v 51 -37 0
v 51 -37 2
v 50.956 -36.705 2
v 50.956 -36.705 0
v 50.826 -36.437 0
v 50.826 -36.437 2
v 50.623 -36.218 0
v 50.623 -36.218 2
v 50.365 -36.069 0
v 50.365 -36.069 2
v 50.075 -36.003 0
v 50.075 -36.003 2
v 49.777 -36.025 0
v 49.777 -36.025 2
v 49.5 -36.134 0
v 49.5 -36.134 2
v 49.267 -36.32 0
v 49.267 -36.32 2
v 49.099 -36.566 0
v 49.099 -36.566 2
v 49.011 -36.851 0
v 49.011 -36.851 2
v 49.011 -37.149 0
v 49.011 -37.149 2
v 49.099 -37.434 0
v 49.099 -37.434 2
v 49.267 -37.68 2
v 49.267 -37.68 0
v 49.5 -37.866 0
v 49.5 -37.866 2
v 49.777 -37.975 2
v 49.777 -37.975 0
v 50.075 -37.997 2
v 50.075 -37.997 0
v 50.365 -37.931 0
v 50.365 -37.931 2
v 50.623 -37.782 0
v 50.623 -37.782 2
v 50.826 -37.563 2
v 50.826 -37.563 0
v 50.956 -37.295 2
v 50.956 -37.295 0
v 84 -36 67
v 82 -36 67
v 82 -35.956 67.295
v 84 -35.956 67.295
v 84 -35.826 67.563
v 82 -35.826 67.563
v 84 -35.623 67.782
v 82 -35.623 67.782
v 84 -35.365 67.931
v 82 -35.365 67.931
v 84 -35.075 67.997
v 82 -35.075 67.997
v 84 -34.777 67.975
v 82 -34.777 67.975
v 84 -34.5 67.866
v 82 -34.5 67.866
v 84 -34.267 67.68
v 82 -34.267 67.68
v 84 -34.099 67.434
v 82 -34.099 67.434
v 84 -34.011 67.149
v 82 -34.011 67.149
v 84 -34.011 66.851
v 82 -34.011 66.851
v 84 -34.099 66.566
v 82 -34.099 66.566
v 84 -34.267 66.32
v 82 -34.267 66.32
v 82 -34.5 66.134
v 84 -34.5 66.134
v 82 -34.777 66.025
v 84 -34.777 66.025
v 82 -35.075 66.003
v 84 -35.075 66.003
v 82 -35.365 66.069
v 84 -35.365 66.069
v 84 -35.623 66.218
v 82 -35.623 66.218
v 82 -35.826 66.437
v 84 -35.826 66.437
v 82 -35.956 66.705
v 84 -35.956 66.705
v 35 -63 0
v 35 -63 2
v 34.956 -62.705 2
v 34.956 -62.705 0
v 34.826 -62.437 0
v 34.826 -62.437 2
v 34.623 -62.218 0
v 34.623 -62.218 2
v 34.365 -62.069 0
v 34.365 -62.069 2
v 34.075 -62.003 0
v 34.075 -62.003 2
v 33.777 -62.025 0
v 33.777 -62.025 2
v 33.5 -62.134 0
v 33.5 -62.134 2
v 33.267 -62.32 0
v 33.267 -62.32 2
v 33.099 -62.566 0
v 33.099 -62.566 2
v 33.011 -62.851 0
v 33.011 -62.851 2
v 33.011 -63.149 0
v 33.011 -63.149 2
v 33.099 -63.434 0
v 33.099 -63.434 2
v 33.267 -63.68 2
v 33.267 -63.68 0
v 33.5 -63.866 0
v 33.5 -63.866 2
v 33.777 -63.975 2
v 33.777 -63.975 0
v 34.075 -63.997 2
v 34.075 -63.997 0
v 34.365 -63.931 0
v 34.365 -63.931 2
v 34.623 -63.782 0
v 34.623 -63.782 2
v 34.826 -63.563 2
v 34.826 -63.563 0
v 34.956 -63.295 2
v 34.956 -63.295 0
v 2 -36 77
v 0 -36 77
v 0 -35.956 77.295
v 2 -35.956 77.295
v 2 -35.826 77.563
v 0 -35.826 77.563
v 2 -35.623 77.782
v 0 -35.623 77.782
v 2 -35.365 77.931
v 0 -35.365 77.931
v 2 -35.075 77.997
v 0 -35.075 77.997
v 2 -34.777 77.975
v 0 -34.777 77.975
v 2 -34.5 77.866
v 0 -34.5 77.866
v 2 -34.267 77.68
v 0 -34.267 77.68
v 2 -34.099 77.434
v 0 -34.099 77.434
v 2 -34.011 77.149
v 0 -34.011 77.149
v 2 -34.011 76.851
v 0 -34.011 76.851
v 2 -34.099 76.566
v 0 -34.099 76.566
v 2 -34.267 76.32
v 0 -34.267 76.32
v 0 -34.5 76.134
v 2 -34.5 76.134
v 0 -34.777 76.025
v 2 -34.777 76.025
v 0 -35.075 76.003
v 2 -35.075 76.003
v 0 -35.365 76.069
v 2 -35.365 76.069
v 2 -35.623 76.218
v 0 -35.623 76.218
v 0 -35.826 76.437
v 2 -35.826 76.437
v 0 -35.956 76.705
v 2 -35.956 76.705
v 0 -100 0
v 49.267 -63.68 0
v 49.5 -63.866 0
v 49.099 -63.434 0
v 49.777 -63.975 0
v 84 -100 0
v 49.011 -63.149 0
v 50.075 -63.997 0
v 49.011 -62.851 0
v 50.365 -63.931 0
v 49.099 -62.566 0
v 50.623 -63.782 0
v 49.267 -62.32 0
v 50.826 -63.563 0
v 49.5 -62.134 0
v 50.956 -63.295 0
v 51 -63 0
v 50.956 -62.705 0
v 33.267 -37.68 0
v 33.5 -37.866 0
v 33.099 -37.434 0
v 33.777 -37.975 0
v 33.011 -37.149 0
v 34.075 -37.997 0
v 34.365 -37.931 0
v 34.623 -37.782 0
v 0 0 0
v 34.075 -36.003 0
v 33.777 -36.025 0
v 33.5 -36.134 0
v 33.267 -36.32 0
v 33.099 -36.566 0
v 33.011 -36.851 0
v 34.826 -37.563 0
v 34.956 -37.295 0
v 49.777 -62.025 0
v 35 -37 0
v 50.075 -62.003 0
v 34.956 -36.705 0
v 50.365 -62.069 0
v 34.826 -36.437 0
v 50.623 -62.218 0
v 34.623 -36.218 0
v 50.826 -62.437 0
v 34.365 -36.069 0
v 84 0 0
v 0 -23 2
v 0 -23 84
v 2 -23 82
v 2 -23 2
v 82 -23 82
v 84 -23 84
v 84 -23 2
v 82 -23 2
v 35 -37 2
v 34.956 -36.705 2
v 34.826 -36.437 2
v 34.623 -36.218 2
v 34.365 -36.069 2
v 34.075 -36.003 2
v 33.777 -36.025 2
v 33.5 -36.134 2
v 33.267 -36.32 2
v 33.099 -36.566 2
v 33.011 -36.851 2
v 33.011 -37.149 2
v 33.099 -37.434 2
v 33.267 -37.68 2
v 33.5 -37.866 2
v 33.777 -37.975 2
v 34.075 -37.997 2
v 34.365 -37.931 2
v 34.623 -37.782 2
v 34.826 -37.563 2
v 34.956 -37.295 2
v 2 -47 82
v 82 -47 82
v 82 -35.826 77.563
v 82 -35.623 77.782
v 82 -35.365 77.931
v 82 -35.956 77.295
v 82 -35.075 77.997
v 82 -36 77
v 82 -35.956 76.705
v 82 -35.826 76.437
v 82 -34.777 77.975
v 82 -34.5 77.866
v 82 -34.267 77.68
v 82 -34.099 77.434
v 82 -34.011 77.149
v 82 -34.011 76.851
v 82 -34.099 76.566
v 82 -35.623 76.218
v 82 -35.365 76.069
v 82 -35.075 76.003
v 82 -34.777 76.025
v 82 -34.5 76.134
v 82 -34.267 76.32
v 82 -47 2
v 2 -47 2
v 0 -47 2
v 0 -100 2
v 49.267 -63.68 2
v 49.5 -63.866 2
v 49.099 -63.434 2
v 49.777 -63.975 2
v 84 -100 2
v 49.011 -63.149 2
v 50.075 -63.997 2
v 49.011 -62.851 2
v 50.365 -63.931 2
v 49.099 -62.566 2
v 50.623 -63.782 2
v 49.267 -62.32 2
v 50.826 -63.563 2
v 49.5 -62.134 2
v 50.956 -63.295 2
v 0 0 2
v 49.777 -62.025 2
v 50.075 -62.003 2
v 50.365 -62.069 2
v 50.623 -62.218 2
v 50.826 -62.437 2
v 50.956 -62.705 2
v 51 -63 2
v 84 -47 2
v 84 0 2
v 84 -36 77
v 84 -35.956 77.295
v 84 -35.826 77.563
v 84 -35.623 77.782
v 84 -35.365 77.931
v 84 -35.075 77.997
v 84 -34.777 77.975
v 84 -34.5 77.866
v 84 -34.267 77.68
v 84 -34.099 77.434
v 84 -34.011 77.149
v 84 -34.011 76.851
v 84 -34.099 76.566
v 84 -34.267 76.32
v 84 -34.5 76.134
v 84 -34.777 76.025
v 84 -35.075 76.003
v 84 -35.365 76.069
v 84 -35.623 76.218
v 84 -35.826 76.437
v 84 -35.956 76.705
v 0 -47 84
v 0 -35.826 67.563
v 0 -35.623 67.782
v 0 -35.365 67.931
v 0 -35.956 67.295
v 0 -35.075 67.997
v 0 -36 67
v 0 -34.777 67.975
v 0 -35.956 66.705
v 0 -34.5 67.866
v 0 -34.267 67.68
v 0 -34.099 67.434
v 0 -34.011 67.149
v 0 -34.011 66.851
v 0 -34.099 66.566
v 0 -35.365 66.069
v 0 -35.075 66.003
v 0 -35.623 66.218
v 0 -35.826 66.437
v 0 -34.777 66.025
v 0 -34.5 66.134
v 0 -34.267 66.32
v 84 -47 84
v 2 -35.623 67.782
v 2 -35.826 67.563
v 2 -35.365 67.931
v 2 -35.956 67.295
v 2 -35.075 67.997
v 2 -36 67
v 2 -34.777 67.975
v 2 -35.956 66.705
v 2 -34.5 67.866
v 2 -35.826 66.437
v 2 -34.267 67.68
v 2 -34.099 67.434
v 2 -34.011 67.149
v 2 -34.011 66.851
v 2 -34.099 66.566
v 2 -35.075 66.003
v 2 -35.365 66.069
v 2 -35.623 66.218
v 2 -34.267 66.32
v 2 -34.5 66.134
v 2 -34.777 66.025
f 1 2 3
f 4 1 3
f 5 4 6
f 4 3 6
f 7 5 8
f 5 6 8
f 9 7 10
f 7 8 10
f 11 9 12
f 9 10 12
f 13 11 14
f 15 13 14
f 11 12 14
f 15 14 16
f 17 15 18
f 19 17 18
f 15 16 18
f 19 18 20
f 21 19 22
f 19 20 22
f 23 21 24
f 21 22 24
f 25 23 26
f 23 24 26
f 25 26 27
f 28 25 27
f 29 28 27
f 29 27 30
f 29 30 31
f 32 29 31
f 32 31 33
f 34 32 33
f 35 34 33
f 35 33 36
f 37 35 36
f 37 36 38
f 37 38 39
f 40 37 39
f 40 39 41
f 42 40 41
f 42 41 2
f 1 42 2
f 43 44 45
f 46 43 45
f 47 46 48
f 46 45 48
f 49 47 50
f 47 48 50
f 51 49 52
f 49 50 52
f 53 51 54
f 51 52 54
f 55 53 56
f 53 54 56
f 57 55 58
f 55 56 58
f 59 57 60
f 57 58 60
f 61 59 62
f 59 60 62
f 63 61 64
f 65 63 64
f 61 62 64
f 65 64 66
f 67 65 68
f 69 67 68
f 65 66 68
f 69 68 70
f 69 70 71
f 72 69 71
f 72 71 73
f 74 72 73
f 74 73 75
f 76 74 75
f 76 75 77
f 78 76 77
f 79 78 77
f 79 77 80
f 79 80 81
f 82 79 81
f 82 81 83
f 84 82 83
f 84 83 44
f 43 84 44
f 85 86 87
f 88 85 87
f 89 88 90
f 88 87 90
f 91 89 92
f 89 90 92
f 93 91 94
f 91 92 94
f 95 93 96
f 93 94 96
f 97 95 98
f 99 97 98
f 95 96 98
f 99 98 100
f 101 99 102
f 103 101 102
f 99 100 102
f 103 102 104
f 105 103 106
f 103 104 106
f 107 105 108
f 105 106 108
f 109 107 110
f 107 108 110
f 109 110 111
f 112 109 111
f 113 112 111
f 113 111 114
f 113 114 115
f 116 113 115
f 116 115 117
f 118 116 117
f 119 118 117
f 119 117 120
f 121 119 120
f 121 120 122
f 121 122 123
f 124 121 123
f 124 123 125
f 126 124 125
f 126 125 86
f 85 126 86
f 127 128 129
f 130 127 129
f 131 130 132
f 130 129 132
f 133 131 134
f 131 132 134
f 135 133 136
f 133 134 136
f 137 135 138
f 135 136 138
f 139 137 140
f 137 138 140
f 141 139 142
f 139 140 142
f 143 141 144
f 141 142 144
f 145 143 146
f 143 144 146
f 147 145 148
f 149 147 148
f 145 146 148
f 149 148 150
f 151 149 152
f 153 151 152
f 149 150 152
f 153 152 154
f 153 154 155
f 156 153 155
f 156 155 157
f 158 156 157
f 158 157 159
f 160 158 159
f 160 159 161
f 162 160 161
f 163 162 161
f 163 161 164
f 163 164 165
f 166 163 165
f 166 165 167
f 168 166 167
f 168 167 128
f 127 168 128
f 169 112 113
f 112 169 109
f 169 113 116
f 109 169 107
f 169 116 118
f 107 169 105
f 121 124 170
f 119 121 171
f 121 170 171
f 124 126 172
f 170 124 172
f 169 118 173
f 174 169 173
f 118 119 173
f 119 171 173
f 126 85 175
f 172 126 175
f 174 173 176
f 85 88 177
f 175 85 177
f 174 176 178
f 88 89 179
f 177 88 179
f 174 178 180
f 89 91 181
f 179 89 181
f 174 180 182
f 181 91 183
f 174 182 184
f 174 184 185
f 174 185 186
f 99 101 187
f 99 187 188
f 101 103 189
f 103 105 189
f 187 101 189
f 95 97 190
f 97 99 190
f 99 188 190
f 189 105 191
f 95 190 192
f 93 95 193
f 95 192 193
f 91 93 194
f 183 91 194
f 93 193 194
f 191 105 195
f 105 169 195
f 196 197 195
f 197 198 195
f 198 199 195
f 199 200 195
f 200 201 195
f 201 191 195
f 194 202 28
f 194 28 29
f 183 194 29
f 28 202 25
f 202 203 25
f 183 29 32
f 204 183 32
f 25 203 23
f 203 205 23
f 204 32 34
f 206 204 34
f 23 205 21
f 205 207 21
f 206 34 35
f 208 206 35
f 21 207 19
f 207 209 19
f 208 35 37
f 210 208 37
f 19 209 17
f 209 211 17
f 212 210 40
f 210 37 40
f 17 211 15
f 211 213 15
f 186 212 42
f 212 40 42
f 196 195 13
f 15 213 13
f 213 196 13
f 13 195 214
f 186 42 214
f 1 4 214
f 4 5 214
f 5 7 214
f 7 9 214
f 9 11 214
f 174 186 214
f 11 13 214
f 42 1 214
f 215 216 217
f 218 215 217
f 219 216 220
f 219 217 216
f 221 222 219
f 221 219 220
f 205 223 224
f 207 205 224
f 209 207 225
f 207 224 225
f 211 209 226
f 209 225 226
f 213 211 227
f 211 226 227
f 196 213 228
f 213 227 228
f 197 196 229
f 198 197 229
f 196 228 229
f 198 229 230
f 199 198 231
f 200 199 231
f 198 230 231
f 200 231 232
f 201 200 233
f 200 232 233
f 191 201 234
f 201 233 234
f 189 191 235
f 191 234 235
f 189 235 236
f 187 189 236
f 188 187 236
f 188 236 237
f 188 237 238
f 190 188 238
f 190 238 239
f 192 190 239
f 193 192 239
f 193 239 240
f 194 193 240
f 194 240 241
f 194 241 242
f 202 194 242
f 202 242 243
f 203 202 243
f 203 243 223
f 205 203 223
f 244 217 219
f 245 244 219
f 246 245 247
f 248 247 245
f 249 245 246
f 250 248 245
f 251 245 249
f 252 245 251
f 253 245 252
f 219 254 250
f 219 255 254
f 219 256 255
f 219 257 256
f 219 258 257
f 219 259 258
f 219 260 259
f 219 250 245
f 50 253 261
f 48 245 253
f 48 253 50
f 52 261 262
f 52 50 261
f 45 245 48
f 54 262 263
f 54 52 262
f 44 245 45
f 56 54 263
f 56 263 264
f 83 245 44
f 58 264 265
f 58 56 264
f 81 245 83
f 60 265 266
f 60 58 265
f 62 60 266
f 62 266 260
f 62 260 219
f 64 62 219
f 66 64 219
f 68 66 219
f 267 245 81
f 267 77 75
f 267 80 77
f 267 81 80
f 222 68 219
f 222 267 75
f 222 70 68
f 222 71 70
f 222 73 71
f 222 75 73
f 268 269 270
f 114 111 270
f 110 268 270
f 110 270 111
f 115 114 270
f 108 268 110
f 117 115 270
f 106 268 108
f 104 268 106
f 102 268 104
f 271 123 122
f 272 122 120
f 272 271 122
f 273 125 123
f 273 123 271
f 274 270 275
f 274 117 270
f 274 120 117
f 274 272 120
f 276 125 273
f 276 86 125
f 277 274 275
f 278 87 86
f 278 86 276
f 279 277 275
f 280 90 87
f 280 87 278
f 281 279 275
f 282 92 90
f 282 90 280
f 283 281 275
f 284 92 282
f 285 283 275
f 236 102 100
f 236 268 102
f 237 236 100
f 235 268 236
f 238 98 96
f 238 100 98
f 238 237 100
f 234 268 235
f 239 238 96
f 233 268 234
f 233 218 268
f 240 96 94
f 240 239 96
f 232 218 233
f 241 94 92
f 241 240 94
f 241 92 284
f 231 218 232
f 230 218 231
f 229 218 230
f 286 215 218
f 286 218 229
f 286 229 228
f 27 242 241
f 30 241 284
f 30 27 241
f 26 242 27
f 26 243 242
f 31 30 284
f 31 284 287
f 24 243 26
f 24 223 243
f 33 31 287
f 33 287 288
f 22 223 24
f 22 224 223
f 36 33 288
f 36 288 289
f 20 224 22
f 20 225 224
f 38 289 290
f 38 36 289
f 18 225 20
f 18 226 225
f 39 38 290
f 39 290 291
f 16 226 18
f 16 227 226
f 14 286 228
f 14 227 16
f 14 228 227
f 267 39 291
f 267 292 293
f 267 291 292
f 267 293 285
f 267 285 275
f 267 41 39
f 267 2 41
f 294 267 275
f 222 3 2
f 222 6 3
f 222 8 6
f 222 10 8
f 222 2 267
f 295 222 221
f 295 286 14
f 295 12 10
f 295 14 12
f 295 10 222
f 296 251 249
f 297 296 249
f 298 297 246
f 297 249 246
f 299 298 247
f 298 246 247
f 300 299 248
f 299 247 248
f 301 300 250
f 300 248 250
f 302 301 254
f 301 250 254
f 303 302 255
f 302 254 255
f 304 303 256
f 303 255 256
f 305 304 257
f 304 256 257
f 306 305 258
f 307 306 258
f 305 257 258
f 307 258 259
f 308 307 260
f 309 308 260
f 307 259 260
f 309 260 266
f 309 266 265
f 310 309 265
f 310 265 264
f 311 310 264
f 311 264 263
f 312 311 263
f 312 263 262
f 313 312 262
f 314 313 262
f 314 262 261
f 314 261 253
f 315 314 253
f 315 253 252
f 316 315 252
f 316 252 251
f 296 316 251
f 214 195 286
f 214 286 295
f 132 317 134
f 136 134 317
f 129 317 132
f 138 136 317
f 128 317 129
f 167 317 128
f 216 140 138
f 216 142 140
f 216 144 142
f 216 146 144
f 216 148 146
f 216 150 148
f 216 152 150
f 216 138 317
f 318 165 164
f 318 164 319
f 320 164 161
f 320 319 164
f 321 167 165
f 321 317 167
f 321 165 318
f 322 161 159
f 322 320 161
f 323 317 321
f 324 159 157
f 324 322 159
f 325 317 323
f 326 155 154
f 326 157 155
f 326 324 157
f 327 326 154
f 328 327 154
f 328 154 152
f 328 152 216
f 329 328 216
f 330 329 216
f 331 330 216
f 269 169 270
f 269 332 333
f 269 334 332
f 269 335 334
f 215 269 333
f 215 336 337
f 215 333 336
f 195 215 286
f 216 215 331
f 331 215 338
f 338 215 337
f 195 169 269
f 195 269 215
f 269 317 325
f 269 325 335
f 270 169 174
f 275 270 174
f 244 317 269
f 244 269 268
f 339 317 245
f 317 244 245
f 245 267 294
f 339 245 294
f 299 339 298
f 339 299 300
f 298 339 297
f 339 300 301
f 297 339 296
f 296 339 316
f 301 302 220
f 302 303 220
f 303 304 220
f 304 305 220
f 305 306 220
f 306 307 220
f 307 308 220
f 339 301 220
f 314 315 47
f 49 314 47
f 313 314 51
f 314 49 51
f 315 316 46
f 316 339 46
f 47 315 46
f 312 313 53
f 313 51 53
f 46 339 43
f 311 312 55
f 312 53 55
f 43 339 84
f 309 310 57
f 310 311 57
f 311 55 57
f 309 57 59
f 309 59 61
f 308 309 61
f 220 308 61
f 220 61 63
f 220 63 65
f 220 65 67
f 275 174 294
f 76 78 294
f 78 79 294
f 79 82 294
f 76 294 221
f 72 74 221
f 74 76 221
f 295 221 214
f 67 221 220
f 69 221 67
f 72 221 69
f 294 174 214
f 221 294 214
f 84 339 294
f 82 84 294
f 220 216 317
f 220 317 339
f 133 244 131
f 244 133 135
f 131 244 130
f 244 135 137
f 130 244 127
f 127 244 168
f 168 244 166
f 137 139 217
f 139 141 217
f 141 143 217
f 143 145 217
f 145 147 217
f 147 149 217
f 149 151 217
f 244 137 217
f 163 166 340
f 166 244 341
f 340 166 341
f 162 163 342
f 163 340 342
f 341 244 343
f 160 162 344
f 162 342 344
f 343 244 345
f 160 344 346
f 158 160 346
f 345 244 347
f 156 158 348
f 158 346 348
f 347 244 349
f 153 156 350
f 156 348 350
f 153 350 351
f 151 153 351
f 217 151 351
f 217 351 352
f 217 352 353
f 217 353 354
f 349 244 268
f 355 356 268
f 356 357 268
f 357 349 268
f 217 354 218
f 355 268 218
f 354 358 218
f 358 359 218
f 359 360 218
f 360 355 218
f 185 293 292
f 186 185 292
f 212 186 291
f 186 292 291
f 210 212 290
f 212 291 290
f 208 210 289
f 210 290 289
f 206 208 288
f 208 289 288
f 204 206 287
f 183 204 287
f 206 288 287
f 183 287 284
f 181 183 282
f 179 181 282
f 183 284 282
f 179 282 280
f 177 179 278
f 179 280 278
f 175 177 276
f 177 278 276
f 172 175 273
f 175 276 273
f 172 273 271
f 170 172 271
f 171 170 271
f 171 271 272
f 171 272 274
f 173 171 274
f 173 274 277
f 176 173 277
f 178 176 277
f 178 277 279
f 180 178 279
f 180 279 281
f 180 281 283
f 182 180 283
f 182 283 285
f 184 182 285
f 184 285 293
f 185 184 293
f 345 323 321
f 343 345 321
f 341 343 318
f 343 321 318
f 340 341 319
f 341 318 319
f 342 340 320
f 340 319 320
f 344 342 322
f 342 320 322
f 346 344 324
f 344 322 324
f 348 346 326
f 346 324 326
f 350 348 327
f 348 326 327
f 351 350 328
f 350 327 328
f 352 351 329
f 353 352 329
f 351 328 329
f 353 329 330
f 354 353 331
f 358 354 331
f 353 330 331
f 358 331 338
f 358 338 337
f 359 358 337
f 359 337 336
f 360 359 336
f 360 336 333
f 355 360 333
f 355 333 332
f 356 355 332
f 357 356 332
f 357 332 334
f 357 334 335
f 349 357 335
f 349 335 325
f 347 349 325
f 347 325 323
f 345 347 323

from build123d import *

# Parameters (mm, degrees)
F0_W     = 84
F0_H     = 100
F1_DEPTH = 2
F2_W     = 2
F2_H     = 24
F3_DEPTH = 80
F4_W     = 84
F4_H     = 24
F5_DEPTH = 2
F7_D     = 2
F7_DEPTH = 2.001
F9_D     = 2


with BuildPart() as f1:
    # F0 (on Top) → F1 (new body)
    with BuildSketch(Plane.XY):
        with Locations((42, -50)):
            Rectangle(F0_W, F0_H)
    extrude(amount=F1_DEPTH)

    # F2 (on face) → F3 (join)
    with BuildSketch(Plane.XY.offset(2)):
        with Locations((1, -35)):
            Rectangle(F2_W, F2_H)
        with Locations((83, -35)):
            Rectangle(F2_W, F2_H)
    extrude(amount=F3_DEPTH)

    # F4 (on face) → F5 (join)
    with BuildSketch(Plane.XY.offset(82)):
        with Locations((42, -35)):
            Rectangle(F4_W, F4_H)
    extrude(amount=F5_DEPTH)

    # F7 (through all, one way)
    with BuildSketch(Plane.XY.offset(2)):
        with Locations((34, -37), (50, -37), (50, -63), (34, -63)):
            Circle(F7_D / 2)
    extrude(amount=-F7_DEPTH, mode=Mode.SUBTRACT)

    # F9 (through all)
    with Locations(Plane.YZ.offset(84)):
        with Locations((-35, 77), (-35, 67)):
            Hole(F9_D / 2)


solid = f1.part
